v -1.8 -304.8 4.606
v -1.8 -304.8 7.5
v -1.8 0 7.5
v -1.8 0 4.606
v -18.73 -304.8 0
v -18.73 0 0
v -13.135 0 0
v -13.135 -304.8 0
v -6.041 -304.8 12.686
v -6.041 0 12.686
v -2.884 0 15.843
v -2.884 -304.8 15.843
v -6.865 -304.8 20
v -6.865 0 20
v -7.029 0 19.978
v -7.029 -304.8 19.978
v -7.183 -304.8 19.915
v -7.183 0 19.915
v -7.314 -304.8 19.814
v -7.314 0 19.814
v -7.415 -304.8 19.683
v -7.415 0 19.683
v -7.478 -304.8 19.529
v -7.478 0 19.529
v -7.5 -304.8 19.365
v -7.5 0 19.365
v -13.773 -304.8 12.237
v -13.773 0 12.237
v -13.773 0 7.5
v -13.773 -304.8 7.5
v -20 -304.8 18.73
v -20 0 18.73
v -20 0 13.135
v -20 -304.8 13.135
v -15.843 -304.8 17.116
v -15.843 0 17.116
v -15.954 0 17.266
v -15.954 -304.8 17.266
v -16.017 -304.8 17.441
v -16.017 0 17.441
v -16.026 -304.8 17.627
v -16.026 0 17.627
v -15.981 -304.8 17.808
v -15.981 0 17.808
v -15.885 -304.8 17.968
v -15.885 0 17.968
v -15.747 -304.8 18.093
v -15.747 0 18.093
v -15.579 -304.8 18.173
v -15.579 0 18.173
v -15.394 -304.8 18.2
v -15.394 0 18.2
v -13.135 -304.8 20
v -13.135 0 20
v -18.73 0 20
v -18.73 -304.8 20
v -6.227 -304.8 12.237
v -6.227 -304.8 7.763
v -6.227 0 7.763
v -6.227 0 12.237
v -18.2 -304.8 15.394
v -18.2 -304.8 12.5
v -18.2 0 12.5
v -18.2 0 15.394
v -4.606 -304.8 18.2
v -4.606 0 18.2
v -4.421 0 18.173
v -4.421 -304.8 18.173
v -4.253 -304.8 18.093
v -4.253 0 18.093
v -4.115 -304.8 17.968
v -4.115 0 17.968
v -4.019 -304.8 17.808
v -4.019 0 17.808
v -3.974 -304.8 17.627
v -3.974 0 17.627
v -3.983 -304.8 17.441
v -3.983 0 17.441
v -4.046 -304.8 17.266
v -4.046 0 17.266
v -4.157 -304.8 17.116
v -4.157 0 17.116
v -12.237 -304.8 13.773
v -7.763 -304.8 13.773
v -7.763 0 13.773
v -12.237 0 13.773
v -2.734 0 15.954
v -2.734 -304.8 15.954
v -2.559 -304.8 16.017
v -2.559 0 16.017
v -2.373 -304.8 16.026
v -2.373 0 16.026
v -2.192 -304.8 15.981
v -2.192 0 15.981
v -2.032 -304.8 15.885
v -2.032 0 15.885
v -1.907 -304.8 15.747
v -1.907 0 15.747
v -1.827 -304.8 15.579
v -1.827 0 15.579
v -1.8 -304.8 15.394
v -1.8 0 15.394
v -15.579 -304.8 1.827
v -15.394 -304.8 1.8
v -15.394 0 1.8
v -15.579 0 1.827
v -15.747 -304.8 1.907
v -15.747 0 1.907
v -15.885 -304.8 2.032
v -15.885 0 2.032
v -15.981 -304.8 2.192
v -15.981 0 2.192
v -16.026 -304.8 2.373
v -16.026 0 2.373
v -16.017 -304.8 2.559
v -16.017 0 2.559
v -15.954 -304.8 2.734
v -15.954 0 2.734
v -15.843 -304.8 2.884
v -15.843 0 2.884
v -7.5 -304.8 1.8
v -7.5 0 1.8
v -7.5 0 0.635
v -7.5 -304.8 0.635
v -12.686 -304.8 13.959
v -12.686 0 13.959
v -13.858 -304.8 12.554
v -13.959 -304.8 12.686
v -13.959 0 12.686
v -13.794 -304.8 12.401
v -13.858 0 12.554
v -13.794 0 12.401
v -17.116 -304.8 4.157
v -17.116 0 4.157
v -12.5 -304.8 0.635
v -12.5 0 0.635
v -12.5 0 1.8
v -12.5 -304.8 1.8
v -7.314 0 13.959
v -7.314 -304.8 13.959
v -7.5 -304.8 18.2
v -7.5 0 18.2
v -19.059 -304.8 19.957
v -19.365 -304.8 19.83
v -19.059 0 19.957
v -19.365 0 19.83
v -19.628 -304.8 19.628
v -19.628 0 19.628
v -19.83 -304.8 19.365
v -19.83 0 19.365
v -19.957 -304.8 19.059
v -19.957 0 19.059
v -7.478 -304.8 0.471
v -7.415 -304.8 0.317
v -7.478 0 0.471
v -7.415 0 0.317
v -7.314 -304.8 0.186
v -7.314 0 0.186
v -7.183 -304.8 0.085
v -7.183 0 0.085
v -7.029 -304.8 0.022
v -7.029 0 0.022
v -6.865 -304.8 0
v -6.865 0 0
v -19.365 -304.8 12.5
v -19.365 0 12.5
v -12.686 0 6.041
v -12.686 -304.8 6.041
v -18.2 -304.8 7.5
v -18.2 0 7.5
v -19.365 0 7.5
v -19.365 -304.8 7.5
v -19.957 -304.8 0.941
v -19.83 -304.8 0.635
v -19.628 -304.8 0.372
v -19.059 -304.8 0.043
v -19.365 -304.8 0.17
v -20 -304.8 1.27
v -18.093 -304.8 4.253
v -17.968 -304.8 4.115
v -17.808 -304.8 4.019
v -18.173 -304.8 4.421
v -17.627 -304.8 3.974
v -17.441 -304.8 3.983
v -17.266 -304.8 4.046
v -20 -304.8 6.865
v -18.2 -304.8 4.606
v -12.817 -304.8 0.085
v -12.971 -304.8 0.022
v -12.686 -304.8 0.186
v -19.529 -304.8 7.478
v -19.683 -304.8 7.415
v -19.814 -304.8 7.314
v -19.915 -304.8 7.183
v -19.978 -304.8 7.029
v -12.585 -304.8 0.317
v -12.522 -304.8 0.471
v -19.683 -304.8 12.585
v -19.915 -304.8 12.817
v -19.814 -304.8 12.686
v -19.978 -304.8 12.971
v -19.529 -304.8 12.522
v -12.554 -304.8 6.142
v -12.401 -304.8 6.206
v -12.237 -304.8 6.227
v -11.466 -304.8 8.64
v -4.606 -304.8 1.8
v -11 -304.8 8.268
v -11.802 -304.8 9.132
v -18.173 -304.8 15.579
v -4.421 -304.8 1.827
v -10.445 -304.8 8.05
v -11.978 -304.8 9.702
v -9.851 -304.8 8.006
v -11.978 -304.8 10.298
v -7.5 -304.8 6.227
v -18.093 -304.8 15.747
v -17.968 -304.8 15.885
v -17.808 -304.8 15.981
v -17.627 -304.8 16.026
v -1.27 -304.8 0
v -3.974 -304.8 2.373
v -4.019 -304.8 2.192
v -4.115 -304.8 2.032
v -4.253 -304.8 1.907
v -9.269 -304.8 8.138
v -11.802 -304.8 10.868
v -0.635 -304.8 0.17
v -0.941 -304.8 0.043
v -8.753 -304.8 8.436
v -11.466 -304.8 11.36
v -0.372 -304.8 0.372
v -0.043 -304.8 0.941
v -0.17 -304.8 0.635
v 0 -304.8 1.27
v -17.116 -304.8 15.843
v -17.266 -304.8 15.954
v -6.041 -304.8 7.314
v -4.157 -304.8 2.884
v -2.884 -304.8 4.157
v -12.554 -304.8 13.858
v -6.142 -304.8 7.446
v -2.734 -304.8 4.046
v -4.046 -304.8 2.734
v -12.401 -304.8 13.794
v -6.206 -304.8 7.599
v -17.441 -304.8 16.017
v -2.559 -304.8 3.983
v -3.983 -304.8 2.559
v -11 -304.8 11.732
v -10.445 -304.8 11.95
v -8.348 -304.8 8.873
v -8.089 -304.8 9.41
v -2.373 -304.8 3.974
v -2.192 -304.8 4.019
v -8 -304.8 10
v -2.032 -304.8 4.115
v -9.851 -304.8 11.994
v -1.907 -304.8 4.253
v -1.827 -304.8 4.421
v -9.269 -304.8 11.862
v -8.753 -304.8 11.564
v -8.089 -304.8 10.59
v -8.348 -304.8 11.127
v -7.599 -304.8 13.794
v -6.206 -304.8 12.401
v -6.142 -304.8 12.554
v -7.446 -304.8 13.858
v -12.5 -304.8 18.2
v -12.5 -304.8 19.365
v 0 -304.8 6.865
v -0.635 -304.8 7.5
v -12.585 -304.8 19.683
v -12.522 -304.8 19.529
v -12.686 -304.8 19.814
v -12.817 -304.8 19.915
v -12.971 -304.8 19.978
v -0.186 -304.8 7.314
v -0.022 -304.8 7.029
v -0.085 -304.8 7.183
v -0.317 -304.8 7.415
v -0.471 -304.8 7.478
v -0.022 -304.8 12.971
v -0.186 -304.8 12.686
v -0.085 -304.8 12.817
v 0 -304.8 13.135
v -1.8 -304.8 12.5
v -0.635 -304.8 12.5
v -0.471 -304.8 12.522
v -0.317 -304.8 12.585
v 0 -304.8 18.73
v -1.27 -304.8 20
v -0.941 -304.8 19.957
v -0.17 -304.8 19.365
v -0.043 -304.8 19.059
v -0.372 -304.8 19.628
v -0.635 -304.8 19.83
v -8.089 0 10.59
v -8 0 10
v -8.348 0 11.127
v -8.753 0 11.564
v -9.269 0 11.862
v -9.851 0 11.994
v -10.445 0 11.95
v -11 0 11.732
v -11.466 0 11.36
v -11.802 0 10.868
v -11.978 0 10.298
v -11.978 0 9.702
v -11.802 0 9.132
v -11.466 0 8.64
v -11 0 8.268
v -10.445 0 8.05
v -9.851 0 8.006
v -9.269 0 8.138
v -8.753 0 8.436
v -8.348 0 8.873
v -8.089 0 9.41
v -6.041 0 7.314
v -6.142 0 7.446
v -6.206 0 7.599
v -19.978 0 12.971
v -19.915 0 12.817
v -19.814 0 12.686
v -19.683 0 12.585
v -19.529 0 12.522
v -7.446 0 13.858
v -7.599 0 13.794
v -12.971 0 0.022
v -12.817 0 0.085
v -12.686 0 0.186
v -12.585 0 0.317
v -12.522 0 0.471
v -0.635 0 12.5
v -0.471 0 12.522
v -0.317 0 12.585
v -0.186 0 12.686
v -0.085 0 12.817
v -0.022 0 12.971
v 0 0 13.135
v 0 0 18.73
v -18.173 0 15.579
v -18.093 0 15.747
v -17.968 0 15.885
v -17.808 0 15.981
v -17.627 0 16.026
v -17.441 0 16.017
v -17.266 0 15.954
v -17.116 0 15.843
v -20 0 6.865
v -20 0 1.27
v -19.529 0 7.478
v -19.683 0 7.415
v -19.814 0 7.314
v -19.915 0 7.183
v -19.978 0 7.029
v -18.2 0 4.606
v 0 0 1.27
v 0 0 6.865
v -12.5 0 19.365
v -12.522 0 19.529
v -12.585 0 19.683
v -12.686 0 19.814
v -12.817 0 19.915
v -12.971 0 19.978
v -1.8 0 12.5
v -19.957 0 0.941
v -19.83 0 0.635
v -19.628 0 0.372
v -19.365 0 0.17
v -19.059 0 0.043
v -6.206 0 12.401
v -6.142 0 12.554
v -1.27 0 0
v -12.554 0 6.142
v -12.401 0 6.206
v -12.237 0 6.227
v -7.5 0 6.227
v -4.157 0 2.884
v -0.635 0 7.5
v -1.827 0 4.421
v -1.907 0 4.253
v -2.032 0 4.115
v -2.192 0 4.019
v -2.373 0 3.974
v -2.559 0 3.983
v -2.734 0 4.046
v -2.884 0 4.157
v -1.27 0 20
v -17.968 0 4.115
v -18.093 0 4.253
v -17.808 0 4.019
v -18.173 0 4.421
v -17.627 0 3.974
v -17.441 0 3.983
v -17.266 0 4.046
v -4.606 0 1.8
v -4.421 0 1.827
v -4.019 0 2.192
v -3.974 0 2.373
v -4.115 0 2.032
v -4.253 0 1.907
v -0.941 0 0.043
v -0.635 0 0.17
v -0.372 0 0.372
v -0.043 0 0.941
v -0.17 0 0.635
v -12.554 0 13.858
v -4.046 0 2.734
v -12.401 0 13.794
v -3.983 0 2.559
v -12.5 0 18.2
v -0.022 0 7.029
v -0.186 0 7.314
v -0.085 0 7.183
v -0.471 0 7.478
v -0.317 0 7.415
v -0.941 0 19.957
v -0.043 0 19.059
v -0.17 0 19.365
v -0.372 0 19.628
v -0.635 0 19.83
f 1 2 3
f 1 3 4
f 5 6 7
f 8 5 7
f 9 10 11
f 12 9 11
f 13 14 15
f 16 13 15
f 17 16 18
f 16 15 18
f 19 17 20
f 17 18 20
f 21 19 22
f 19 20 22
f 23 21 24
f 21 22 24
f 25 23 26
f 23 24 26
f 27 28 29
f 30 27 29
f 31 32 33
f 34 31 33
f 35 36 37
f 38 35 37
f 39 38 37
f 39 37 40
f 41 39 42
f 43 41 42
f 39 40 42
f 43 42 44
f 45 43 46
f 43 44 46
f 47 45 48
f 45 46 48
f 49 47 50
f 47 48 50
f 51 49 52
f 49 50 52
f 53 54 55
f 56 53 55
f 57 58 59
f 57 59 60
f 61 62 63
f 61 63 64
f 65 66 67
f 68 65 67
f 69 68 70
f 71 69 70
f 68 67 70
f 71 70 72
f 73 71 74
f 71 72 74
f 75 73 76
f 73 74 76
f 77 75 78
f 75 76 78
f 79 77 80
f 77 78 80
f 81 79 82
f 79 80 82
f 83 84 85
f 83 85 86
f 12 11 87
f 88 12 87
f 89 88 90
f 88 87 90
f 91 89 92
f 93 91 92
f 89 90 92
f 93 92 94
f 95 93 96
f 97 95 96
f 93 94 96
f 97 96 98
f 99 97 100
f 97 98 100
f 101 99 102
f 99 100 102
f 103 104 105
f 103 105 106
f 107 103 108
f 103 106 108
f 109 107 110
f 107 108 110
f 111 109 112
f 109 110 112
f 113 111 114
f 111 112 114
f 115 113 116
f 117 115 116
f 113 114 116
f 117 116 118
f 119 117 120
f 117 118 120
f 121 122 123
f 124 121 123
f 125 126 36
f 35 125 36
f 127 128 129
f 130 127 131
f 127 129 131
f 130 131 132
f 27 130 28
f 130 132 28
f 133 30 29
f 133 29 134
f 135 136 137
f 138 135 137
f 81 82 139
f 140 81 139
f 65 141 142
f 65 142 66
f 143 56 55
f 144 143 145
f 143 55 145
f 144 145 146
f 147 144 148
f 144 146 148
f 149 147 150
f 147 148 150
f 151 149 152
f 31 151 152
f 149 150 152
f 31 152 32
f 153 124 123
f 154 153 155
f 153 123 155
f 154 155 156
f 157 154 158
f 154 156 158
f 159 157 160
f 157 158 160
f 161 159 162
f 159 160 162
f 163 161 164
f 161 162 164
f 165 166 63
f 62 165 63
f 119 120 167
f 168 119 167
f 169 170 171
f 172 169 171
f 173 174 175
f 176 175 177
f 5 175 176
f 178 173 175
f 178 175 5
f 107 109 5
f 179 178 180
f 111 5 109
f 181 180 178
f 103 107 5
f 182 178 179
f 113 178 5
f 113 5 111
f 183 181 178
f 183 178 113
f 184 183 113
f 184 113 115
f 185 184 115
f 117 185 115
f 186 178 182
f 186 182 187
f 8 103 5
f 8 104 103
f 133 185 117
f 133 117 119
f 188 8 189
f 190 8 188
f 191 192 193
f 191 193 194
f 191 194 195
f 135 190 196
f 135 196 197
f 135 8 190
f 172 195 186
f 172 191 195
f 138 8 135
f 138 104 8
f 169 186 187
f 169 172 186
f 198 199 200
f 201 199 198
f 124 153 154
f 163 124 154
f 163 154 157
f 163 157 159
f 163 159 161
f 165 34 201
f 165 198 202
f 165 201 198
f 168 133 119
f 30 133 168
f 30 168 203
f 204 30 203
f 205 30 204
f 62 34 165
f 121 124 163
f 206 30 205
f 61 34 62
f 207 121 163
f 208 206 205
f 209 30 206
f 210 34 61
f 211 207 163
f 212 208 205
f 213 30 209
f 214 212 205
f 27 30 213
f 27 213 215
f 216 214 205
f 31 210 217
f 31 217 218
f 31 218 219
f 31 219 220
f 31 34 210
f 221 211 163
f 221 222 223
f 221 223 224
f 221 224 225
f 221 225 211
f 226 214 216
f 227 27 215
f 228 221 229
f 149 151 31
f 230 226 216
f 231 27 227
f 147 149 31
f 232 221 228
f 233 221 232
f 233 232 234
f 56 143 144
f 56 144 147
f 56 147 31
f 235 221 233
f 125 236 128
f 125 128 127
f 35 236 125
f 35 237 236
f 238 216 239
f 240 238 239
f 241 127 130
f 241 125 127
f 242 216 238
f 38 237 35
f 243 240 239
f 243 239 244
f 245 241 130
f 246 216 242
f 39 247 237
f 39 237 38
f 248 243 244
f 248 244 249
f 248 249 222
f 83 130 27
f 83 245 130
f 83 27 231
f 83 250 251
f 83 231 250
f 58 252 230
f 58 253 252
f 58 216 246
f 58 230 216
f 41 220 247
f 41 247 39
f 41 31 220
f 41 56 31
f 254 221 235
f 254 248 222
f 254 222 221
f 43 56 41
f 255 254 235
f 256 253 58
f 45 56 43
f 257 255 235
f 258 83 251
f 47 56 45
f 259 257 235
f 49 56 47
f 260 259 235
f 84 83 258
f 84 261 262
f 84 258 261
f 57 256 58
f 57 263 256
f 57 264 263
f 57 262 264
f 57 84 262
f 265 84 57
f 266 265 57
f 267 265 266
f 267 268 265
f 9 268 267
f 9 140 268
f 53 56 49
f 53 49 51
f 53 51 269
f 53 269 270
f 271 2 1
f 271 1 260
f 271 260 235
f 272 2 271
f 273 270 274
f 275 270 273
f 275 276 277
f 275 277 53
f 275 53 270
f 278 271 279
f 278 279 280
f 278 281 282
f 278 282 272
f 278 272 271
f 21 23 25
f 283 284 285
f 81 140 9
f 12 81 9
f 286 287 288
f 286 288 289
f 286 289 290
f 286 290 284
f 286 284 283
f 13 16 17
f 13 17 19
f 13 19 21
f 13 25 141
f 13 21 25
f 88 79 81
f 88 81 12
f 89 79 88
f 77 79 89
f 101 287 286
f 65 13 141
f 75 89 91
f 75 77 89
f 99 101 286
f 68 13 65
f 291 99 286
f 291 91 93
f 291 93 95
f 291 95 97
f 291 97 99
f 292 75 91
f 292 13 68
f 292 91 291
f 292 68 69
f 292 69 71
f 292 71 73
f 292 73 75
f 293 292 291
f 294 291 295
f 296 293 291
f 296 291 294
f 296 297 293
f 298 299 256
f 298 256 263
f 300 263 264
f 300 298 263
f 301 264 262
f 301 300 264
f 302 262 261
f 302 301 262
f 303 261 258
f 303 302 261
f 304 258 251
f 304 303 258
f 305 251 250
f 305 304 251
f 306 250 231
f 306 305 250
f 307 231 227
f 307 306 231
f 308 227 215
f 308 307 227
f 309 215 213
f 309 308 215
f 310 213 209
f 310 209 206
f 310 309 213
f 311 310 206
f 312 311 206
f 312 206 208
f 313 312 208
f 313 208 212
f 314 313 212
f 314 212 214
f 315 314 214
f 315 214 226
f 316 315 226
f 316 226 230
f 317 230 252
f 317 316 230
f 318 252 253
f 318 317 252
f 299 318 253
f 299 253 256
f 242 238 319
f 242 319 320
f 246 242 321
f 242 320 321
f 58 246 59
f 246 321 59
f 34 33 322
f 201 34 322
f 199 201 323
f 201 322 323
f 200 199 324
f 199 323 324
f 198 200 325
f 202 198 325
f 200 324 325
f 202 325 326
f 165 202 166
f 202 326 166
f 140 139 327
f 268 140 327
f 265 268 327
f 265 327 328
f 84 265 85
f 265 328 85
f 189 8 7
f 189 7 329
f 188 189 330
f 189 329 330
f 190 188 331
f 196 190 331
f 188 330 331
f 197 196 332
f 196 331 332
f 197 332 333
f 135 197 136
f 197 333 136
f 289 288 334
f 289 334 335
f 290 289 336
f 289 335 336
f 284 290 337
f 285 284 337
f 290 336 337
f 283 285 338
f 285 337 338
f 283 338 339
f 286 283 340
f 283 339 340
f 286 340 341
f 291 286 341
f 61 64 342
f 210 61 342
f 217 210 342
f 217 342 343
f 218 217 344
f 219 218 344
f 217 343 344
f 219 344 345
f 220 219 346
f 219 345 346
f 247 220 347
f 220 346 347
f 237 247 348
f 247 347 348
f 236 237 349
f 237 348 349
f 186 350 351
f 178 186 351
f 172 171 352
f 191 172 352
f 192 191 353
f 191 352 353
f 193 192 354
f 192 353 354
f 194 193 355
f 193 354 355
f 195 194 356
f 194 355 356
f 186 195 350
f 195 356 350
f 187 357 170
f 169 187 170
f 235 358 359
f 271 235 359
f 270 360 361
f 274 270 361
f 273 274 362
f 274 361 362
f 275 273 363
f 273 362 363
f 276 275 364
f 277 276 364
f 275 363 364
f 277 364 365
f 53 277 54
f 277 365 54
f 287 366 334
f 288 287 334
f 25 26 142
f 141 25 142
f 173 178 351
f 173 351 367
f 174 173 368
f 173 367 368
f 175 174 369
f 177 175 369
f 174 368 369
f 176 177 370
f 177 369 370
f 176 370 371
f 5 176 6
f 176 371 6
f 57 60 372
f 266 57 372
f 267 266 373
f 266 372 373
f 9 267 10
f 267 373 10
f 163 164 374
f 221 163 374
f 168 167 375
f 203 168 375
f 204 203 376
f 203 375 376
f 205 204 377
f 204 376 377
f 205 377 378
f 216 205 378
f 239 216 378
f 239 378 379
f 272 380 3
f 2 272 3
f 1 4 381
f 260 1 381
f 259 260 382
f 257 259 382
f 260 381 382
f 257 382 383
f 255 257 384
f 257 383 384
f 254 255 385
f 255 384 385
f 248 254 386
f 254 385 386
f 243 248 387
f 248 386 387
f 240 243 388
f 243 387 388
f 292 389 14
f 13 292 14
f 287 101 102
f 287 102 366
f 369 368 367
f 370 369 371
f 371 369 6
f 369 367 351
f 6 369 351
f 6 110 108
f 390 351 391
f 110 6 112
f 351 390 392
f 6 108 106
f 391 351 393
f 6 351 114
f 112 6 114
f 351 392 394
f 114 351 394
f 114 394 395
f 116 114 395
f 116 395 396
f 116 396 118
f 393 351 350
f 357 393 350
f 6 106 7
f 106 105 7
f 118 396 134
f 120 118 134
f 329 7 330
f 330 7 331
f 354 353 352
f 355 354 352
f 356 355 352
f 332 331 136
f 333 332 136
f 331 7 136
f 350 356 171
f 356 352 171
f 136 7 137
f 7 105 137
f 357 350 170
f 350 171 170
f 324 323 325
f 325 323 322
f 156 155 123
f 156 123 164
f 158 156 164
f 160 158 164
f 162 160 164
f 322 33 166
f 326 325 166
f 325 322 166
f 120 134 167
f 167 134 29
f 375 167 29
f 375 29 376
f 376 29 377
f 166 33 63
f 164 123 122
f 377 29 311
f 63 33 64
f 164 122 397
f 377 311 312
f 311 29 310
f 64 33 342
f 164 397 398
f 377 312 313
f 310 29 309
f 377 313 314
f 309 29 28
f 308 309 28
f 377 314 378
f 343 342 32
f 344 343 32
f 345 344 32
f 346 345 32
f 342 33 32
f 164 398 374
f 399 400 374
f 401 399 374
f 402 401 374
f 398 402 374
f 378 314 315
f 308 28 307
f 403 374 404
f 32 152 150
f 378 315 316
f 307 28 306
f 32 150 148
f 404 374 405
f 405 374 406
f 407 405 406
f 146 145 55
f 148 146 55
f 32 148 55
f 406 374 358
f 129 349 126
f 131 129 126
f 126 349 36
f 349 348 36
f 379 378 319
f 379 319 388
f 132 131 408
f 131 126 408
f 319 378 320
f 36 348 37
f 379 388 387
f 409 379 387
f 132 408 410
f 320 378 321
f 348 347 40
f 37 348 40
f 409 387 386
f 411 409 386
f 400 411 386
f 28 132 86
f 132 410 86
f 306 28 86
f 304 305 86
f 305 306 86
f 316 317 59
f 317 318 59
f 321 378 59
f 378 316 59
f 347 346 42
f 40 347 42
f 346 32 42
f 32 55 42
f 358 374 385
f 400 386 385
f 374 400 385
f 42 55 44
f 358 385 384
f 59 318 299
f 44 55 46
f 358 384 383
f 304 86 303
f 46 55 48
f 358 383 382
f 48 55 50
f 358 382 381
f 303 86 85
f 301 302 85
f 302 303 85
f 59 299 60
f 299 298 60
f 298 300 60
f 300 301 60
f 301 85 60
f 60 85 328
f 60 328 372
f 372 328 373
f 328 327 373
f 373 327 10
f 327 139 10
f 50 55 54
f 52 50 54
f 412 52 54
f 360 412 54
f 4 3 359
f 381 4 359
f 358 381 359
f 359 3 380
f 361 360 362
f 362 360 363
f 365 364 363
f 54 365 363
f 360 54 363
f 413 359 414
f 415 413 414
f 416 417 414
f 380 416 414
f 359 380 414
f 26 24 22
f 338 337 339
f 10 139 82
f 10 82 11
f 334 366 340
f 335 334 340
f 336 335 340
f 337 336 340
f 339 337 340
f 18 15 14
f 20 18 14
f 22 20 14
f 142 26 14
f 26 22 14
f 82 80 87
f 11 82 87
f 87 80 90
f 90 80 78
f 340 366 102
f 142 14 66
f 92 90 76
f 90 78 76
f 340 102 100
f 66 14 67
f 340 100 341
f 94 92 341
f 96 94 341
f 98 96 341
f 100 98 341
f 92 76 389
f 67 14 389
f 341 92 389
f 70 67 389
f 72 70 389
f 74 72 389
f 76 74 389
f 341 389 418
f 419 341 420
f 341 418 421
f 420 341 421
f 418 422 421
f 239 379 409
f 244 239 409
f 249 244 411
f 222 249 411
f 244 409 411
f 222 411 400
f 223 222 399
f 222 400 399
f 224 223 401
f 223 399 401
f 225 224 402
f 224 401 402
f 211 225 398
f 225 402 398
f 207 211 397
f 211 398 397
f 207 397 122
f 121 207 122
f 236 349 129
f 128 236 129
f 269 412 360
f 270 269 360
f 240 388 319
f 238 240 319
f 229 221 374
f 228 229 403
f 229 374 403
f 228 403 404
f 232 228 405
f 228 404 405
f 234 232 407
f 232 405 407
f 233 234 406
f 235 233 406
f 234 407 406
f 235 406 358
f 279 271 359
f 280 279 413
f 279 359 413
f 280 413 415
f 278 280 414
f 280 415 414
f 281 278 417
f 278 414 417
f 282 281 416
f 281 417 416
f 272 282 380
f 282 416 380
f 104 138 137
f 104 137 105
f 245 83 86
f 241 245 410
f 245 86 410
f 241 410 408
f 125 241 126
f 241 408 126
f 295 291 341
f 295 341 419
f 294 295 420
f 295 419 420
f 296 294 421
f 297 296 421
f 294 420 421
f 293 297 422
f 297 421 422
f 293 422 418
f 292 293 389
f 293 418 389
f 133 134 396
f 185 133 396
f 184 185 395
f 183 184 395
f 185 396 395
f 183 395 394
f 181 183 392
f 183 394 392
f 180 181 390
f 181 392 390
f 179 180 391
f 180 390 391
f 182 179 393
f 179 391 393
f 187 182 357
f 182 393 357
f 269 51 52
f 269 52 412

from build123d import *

# Parameters (mm, degrees)
F0_R     = 2
F1_DEPTH = 304.8


with BuildPart() as f1:
    # F0 (on Front) → F1 (new body)
    with BuildSketch(Plane.XZ):
        with BuildLine():
            Line((-13.135, 20), (-18.73, 20))
            ThreePointArc((-18.73, 20), (-19.628026, 19.628026), (-20, 18.73))
            Line((-20, 18.73), (-20, 13.135))
            ThreePointArc((-20, 13.135), (-19.814013, 12.685987), (-19.365, 12.5))
            Line((-19.365, 12.5), (-18.2, 12.5))
            Line((-18.2, 12.5), (-18.2, 15.394182))
            ThreePointArc((-18.2, 15.394182), (-17.808004, 15.980846), (-17.115987, 15.843195))
            Line((-17.115987, 15.843195), (-13.958779, 12.685987))
            ThreePointArc((-13.958779, 12.685987), (-13.821129, 12.479978), (-13.772792, 12.236974))
            Line((-13.772792, 12.236974), (-13.772792, 10))
            Line((-13.772792, 10), (-13.772792, 7.5))
            Line((-13.772792, 7.5), (-17.115987, 4.156805))
            ThreePointArc((-17.115987, 4.156805), (-17.808004, 4.019154), (-18.2, 4.605818))
            Line((-18.2, 4.605818), (-18.2, 7.5))
            Line((-18.2, 7.5), (-19.365, 7.5))
            ThreePointArc((-19.365, 7.5), (-19.814013, 7.314013), (-20, 6.865))
            Line((-20, 6.865), (-20, 1.27))
            ThreePointArc((-20, 1.27), (-19.628026, 0.371974), (-18.73, 0))
            Line((-18.73, 0), (-13.135, 0))
            ThreePointArc((-13.135, 0), (-12.685987, 0.185987), (-12.5, 0.635))
            Line((-12.5, 0.635), (-12.5, 1.8))
            Line((-12.5, 1.8), (-15.394182, 1.8))
            ThreePointArc((-15.394182, 1.8), (-15.980846, 2.191996), (-15.843195, 2.884013))
            Line((-15.843195, 2.884013), (-12.685987, 6.041221))
            ThreePointArc((-12.685987, 6.041221), (-12.479978, 6.178871), (-12.236974, 6.227208))
            Line((-12.236974, 6.227208), (-10, 6.227208))
            Line((-10, 6.227208), (-7.5, 6.227208))
            Line((-7.5, 6.227208), (-4.156805, 2.884013))
            ThreePointArc((-4.156805, 2.884013), (-4.019154, 2.191996), (-4.605818, 1.8))
            Line((-4.605818, 1.8), (-7.5, 1.8))
            Line((-7.5, 1.8), (-7.5, 0.635))
            ThreePointArc((-7.5, 0.635), (-7.314013, 0.185987), (-6.865, 0))
            Line((-6.865, 0), (-1.27, 0))
            ThreePointArc((-1.27, 0), (-0.371974, 0.371974), (0, 1.27))
            Line((0, 1.27), (0, 6.865))
            ThreePointArc((0, 6.865), (-0.185987, 7.314013), (-0.635, 7.5))
            Line((-0.635, 7.5), (-1.8, 7.5))
            Line((-1.8, 7.5), (-1.8, 4.605818))
            ThreePointArc((-1.8, 4.605818), (-2.191996, 4.019154), (-2.884013, 4.156805))
            Line((-2.884013, 4.156805), (-6.041221, 7.314013))
            ThreePointArc((-6.041221, 7.314013), (-6.178871, 7.520022), (-6.227208, 7.763026))
            Line((-6.227208, 7.763026), (-6.227208, 10))
            Line((-6.227208, 10), (-6.227208, 12.236974))
            ThreePointArc((-6.227208, 12.236974), (-6.178871, 12.479978), (-6.041221, 12.685987))
            Line((-6.041221, 12.685987), (-2.884013, 15.843195))
            ThreePointArc((-2.884013, 15.843195), (-2.191996, 15.980846), (-1.8, 15.394182))
            Line((-1.8, 15.394182), (-1.8, 12.5))
            Line((-1.8, 12.5), (-0.635, 12.5))
            ThreePointArc((-0.635, 12.5), (-0.185987, 12.685987), (0, 13.135))
            Line((0, 13.135), (0, 18.73))
            ThreePointArc((0, 18.73), (-0.371974, 19.628026), (-1.27, 20))
            Line((-1.27, 20), (-6.865, 20))
            ThreePointArc((-6.865, 20), (-7.314013, 19.814013), (-7.5, 19.365))
            Line((-7.5, 19.365), (-7.5, 18.2))
            Line((-7.5, 18.2), (-4.605818, 18.2))
            ThreePointArc((-4.605818, 18.2), (-4.019154, 17.808004), (-4.156805, 17.115987))
            Line((-4.156805, 17.115987), (-7.314013, 13.958779))
            ThreePointArc((-7.314013, 13.958779), (-7.520022, 13.821129), (-7.763026, 13.772792))
            Line((-7.763026, 13.772792), (-10, 13.772792))
            Line((-10, 13.772792), (-12.236974, 13.772792))
            ThreePointArc((-12.236974, 13.772792), (-12.479978, 13.821129), (-12.685987, 13.958779))
            Line((-12.685987, 13.958779), (-15.843195, 17.115987))
            ThreePointArc((-15.843195, 17.115987), (-15.980846, 17.808004), (-15.394182, 18.2))
            Line((-15.394182, 18.2), (-12.5, 18.2))
            Line((-12.5, 18.2), (-12.5, 19.365))
            ThreePointArc((-12.5, 19.365), (-12.685987, 19.814013), (-13.135, 20))
        make_face()
        with Locations((-10, 10)):
            Circle(F0_R, mode=Mode.SUBTRACT)
    extrude(amount=F1_DEPTH)


solid = f1.part
